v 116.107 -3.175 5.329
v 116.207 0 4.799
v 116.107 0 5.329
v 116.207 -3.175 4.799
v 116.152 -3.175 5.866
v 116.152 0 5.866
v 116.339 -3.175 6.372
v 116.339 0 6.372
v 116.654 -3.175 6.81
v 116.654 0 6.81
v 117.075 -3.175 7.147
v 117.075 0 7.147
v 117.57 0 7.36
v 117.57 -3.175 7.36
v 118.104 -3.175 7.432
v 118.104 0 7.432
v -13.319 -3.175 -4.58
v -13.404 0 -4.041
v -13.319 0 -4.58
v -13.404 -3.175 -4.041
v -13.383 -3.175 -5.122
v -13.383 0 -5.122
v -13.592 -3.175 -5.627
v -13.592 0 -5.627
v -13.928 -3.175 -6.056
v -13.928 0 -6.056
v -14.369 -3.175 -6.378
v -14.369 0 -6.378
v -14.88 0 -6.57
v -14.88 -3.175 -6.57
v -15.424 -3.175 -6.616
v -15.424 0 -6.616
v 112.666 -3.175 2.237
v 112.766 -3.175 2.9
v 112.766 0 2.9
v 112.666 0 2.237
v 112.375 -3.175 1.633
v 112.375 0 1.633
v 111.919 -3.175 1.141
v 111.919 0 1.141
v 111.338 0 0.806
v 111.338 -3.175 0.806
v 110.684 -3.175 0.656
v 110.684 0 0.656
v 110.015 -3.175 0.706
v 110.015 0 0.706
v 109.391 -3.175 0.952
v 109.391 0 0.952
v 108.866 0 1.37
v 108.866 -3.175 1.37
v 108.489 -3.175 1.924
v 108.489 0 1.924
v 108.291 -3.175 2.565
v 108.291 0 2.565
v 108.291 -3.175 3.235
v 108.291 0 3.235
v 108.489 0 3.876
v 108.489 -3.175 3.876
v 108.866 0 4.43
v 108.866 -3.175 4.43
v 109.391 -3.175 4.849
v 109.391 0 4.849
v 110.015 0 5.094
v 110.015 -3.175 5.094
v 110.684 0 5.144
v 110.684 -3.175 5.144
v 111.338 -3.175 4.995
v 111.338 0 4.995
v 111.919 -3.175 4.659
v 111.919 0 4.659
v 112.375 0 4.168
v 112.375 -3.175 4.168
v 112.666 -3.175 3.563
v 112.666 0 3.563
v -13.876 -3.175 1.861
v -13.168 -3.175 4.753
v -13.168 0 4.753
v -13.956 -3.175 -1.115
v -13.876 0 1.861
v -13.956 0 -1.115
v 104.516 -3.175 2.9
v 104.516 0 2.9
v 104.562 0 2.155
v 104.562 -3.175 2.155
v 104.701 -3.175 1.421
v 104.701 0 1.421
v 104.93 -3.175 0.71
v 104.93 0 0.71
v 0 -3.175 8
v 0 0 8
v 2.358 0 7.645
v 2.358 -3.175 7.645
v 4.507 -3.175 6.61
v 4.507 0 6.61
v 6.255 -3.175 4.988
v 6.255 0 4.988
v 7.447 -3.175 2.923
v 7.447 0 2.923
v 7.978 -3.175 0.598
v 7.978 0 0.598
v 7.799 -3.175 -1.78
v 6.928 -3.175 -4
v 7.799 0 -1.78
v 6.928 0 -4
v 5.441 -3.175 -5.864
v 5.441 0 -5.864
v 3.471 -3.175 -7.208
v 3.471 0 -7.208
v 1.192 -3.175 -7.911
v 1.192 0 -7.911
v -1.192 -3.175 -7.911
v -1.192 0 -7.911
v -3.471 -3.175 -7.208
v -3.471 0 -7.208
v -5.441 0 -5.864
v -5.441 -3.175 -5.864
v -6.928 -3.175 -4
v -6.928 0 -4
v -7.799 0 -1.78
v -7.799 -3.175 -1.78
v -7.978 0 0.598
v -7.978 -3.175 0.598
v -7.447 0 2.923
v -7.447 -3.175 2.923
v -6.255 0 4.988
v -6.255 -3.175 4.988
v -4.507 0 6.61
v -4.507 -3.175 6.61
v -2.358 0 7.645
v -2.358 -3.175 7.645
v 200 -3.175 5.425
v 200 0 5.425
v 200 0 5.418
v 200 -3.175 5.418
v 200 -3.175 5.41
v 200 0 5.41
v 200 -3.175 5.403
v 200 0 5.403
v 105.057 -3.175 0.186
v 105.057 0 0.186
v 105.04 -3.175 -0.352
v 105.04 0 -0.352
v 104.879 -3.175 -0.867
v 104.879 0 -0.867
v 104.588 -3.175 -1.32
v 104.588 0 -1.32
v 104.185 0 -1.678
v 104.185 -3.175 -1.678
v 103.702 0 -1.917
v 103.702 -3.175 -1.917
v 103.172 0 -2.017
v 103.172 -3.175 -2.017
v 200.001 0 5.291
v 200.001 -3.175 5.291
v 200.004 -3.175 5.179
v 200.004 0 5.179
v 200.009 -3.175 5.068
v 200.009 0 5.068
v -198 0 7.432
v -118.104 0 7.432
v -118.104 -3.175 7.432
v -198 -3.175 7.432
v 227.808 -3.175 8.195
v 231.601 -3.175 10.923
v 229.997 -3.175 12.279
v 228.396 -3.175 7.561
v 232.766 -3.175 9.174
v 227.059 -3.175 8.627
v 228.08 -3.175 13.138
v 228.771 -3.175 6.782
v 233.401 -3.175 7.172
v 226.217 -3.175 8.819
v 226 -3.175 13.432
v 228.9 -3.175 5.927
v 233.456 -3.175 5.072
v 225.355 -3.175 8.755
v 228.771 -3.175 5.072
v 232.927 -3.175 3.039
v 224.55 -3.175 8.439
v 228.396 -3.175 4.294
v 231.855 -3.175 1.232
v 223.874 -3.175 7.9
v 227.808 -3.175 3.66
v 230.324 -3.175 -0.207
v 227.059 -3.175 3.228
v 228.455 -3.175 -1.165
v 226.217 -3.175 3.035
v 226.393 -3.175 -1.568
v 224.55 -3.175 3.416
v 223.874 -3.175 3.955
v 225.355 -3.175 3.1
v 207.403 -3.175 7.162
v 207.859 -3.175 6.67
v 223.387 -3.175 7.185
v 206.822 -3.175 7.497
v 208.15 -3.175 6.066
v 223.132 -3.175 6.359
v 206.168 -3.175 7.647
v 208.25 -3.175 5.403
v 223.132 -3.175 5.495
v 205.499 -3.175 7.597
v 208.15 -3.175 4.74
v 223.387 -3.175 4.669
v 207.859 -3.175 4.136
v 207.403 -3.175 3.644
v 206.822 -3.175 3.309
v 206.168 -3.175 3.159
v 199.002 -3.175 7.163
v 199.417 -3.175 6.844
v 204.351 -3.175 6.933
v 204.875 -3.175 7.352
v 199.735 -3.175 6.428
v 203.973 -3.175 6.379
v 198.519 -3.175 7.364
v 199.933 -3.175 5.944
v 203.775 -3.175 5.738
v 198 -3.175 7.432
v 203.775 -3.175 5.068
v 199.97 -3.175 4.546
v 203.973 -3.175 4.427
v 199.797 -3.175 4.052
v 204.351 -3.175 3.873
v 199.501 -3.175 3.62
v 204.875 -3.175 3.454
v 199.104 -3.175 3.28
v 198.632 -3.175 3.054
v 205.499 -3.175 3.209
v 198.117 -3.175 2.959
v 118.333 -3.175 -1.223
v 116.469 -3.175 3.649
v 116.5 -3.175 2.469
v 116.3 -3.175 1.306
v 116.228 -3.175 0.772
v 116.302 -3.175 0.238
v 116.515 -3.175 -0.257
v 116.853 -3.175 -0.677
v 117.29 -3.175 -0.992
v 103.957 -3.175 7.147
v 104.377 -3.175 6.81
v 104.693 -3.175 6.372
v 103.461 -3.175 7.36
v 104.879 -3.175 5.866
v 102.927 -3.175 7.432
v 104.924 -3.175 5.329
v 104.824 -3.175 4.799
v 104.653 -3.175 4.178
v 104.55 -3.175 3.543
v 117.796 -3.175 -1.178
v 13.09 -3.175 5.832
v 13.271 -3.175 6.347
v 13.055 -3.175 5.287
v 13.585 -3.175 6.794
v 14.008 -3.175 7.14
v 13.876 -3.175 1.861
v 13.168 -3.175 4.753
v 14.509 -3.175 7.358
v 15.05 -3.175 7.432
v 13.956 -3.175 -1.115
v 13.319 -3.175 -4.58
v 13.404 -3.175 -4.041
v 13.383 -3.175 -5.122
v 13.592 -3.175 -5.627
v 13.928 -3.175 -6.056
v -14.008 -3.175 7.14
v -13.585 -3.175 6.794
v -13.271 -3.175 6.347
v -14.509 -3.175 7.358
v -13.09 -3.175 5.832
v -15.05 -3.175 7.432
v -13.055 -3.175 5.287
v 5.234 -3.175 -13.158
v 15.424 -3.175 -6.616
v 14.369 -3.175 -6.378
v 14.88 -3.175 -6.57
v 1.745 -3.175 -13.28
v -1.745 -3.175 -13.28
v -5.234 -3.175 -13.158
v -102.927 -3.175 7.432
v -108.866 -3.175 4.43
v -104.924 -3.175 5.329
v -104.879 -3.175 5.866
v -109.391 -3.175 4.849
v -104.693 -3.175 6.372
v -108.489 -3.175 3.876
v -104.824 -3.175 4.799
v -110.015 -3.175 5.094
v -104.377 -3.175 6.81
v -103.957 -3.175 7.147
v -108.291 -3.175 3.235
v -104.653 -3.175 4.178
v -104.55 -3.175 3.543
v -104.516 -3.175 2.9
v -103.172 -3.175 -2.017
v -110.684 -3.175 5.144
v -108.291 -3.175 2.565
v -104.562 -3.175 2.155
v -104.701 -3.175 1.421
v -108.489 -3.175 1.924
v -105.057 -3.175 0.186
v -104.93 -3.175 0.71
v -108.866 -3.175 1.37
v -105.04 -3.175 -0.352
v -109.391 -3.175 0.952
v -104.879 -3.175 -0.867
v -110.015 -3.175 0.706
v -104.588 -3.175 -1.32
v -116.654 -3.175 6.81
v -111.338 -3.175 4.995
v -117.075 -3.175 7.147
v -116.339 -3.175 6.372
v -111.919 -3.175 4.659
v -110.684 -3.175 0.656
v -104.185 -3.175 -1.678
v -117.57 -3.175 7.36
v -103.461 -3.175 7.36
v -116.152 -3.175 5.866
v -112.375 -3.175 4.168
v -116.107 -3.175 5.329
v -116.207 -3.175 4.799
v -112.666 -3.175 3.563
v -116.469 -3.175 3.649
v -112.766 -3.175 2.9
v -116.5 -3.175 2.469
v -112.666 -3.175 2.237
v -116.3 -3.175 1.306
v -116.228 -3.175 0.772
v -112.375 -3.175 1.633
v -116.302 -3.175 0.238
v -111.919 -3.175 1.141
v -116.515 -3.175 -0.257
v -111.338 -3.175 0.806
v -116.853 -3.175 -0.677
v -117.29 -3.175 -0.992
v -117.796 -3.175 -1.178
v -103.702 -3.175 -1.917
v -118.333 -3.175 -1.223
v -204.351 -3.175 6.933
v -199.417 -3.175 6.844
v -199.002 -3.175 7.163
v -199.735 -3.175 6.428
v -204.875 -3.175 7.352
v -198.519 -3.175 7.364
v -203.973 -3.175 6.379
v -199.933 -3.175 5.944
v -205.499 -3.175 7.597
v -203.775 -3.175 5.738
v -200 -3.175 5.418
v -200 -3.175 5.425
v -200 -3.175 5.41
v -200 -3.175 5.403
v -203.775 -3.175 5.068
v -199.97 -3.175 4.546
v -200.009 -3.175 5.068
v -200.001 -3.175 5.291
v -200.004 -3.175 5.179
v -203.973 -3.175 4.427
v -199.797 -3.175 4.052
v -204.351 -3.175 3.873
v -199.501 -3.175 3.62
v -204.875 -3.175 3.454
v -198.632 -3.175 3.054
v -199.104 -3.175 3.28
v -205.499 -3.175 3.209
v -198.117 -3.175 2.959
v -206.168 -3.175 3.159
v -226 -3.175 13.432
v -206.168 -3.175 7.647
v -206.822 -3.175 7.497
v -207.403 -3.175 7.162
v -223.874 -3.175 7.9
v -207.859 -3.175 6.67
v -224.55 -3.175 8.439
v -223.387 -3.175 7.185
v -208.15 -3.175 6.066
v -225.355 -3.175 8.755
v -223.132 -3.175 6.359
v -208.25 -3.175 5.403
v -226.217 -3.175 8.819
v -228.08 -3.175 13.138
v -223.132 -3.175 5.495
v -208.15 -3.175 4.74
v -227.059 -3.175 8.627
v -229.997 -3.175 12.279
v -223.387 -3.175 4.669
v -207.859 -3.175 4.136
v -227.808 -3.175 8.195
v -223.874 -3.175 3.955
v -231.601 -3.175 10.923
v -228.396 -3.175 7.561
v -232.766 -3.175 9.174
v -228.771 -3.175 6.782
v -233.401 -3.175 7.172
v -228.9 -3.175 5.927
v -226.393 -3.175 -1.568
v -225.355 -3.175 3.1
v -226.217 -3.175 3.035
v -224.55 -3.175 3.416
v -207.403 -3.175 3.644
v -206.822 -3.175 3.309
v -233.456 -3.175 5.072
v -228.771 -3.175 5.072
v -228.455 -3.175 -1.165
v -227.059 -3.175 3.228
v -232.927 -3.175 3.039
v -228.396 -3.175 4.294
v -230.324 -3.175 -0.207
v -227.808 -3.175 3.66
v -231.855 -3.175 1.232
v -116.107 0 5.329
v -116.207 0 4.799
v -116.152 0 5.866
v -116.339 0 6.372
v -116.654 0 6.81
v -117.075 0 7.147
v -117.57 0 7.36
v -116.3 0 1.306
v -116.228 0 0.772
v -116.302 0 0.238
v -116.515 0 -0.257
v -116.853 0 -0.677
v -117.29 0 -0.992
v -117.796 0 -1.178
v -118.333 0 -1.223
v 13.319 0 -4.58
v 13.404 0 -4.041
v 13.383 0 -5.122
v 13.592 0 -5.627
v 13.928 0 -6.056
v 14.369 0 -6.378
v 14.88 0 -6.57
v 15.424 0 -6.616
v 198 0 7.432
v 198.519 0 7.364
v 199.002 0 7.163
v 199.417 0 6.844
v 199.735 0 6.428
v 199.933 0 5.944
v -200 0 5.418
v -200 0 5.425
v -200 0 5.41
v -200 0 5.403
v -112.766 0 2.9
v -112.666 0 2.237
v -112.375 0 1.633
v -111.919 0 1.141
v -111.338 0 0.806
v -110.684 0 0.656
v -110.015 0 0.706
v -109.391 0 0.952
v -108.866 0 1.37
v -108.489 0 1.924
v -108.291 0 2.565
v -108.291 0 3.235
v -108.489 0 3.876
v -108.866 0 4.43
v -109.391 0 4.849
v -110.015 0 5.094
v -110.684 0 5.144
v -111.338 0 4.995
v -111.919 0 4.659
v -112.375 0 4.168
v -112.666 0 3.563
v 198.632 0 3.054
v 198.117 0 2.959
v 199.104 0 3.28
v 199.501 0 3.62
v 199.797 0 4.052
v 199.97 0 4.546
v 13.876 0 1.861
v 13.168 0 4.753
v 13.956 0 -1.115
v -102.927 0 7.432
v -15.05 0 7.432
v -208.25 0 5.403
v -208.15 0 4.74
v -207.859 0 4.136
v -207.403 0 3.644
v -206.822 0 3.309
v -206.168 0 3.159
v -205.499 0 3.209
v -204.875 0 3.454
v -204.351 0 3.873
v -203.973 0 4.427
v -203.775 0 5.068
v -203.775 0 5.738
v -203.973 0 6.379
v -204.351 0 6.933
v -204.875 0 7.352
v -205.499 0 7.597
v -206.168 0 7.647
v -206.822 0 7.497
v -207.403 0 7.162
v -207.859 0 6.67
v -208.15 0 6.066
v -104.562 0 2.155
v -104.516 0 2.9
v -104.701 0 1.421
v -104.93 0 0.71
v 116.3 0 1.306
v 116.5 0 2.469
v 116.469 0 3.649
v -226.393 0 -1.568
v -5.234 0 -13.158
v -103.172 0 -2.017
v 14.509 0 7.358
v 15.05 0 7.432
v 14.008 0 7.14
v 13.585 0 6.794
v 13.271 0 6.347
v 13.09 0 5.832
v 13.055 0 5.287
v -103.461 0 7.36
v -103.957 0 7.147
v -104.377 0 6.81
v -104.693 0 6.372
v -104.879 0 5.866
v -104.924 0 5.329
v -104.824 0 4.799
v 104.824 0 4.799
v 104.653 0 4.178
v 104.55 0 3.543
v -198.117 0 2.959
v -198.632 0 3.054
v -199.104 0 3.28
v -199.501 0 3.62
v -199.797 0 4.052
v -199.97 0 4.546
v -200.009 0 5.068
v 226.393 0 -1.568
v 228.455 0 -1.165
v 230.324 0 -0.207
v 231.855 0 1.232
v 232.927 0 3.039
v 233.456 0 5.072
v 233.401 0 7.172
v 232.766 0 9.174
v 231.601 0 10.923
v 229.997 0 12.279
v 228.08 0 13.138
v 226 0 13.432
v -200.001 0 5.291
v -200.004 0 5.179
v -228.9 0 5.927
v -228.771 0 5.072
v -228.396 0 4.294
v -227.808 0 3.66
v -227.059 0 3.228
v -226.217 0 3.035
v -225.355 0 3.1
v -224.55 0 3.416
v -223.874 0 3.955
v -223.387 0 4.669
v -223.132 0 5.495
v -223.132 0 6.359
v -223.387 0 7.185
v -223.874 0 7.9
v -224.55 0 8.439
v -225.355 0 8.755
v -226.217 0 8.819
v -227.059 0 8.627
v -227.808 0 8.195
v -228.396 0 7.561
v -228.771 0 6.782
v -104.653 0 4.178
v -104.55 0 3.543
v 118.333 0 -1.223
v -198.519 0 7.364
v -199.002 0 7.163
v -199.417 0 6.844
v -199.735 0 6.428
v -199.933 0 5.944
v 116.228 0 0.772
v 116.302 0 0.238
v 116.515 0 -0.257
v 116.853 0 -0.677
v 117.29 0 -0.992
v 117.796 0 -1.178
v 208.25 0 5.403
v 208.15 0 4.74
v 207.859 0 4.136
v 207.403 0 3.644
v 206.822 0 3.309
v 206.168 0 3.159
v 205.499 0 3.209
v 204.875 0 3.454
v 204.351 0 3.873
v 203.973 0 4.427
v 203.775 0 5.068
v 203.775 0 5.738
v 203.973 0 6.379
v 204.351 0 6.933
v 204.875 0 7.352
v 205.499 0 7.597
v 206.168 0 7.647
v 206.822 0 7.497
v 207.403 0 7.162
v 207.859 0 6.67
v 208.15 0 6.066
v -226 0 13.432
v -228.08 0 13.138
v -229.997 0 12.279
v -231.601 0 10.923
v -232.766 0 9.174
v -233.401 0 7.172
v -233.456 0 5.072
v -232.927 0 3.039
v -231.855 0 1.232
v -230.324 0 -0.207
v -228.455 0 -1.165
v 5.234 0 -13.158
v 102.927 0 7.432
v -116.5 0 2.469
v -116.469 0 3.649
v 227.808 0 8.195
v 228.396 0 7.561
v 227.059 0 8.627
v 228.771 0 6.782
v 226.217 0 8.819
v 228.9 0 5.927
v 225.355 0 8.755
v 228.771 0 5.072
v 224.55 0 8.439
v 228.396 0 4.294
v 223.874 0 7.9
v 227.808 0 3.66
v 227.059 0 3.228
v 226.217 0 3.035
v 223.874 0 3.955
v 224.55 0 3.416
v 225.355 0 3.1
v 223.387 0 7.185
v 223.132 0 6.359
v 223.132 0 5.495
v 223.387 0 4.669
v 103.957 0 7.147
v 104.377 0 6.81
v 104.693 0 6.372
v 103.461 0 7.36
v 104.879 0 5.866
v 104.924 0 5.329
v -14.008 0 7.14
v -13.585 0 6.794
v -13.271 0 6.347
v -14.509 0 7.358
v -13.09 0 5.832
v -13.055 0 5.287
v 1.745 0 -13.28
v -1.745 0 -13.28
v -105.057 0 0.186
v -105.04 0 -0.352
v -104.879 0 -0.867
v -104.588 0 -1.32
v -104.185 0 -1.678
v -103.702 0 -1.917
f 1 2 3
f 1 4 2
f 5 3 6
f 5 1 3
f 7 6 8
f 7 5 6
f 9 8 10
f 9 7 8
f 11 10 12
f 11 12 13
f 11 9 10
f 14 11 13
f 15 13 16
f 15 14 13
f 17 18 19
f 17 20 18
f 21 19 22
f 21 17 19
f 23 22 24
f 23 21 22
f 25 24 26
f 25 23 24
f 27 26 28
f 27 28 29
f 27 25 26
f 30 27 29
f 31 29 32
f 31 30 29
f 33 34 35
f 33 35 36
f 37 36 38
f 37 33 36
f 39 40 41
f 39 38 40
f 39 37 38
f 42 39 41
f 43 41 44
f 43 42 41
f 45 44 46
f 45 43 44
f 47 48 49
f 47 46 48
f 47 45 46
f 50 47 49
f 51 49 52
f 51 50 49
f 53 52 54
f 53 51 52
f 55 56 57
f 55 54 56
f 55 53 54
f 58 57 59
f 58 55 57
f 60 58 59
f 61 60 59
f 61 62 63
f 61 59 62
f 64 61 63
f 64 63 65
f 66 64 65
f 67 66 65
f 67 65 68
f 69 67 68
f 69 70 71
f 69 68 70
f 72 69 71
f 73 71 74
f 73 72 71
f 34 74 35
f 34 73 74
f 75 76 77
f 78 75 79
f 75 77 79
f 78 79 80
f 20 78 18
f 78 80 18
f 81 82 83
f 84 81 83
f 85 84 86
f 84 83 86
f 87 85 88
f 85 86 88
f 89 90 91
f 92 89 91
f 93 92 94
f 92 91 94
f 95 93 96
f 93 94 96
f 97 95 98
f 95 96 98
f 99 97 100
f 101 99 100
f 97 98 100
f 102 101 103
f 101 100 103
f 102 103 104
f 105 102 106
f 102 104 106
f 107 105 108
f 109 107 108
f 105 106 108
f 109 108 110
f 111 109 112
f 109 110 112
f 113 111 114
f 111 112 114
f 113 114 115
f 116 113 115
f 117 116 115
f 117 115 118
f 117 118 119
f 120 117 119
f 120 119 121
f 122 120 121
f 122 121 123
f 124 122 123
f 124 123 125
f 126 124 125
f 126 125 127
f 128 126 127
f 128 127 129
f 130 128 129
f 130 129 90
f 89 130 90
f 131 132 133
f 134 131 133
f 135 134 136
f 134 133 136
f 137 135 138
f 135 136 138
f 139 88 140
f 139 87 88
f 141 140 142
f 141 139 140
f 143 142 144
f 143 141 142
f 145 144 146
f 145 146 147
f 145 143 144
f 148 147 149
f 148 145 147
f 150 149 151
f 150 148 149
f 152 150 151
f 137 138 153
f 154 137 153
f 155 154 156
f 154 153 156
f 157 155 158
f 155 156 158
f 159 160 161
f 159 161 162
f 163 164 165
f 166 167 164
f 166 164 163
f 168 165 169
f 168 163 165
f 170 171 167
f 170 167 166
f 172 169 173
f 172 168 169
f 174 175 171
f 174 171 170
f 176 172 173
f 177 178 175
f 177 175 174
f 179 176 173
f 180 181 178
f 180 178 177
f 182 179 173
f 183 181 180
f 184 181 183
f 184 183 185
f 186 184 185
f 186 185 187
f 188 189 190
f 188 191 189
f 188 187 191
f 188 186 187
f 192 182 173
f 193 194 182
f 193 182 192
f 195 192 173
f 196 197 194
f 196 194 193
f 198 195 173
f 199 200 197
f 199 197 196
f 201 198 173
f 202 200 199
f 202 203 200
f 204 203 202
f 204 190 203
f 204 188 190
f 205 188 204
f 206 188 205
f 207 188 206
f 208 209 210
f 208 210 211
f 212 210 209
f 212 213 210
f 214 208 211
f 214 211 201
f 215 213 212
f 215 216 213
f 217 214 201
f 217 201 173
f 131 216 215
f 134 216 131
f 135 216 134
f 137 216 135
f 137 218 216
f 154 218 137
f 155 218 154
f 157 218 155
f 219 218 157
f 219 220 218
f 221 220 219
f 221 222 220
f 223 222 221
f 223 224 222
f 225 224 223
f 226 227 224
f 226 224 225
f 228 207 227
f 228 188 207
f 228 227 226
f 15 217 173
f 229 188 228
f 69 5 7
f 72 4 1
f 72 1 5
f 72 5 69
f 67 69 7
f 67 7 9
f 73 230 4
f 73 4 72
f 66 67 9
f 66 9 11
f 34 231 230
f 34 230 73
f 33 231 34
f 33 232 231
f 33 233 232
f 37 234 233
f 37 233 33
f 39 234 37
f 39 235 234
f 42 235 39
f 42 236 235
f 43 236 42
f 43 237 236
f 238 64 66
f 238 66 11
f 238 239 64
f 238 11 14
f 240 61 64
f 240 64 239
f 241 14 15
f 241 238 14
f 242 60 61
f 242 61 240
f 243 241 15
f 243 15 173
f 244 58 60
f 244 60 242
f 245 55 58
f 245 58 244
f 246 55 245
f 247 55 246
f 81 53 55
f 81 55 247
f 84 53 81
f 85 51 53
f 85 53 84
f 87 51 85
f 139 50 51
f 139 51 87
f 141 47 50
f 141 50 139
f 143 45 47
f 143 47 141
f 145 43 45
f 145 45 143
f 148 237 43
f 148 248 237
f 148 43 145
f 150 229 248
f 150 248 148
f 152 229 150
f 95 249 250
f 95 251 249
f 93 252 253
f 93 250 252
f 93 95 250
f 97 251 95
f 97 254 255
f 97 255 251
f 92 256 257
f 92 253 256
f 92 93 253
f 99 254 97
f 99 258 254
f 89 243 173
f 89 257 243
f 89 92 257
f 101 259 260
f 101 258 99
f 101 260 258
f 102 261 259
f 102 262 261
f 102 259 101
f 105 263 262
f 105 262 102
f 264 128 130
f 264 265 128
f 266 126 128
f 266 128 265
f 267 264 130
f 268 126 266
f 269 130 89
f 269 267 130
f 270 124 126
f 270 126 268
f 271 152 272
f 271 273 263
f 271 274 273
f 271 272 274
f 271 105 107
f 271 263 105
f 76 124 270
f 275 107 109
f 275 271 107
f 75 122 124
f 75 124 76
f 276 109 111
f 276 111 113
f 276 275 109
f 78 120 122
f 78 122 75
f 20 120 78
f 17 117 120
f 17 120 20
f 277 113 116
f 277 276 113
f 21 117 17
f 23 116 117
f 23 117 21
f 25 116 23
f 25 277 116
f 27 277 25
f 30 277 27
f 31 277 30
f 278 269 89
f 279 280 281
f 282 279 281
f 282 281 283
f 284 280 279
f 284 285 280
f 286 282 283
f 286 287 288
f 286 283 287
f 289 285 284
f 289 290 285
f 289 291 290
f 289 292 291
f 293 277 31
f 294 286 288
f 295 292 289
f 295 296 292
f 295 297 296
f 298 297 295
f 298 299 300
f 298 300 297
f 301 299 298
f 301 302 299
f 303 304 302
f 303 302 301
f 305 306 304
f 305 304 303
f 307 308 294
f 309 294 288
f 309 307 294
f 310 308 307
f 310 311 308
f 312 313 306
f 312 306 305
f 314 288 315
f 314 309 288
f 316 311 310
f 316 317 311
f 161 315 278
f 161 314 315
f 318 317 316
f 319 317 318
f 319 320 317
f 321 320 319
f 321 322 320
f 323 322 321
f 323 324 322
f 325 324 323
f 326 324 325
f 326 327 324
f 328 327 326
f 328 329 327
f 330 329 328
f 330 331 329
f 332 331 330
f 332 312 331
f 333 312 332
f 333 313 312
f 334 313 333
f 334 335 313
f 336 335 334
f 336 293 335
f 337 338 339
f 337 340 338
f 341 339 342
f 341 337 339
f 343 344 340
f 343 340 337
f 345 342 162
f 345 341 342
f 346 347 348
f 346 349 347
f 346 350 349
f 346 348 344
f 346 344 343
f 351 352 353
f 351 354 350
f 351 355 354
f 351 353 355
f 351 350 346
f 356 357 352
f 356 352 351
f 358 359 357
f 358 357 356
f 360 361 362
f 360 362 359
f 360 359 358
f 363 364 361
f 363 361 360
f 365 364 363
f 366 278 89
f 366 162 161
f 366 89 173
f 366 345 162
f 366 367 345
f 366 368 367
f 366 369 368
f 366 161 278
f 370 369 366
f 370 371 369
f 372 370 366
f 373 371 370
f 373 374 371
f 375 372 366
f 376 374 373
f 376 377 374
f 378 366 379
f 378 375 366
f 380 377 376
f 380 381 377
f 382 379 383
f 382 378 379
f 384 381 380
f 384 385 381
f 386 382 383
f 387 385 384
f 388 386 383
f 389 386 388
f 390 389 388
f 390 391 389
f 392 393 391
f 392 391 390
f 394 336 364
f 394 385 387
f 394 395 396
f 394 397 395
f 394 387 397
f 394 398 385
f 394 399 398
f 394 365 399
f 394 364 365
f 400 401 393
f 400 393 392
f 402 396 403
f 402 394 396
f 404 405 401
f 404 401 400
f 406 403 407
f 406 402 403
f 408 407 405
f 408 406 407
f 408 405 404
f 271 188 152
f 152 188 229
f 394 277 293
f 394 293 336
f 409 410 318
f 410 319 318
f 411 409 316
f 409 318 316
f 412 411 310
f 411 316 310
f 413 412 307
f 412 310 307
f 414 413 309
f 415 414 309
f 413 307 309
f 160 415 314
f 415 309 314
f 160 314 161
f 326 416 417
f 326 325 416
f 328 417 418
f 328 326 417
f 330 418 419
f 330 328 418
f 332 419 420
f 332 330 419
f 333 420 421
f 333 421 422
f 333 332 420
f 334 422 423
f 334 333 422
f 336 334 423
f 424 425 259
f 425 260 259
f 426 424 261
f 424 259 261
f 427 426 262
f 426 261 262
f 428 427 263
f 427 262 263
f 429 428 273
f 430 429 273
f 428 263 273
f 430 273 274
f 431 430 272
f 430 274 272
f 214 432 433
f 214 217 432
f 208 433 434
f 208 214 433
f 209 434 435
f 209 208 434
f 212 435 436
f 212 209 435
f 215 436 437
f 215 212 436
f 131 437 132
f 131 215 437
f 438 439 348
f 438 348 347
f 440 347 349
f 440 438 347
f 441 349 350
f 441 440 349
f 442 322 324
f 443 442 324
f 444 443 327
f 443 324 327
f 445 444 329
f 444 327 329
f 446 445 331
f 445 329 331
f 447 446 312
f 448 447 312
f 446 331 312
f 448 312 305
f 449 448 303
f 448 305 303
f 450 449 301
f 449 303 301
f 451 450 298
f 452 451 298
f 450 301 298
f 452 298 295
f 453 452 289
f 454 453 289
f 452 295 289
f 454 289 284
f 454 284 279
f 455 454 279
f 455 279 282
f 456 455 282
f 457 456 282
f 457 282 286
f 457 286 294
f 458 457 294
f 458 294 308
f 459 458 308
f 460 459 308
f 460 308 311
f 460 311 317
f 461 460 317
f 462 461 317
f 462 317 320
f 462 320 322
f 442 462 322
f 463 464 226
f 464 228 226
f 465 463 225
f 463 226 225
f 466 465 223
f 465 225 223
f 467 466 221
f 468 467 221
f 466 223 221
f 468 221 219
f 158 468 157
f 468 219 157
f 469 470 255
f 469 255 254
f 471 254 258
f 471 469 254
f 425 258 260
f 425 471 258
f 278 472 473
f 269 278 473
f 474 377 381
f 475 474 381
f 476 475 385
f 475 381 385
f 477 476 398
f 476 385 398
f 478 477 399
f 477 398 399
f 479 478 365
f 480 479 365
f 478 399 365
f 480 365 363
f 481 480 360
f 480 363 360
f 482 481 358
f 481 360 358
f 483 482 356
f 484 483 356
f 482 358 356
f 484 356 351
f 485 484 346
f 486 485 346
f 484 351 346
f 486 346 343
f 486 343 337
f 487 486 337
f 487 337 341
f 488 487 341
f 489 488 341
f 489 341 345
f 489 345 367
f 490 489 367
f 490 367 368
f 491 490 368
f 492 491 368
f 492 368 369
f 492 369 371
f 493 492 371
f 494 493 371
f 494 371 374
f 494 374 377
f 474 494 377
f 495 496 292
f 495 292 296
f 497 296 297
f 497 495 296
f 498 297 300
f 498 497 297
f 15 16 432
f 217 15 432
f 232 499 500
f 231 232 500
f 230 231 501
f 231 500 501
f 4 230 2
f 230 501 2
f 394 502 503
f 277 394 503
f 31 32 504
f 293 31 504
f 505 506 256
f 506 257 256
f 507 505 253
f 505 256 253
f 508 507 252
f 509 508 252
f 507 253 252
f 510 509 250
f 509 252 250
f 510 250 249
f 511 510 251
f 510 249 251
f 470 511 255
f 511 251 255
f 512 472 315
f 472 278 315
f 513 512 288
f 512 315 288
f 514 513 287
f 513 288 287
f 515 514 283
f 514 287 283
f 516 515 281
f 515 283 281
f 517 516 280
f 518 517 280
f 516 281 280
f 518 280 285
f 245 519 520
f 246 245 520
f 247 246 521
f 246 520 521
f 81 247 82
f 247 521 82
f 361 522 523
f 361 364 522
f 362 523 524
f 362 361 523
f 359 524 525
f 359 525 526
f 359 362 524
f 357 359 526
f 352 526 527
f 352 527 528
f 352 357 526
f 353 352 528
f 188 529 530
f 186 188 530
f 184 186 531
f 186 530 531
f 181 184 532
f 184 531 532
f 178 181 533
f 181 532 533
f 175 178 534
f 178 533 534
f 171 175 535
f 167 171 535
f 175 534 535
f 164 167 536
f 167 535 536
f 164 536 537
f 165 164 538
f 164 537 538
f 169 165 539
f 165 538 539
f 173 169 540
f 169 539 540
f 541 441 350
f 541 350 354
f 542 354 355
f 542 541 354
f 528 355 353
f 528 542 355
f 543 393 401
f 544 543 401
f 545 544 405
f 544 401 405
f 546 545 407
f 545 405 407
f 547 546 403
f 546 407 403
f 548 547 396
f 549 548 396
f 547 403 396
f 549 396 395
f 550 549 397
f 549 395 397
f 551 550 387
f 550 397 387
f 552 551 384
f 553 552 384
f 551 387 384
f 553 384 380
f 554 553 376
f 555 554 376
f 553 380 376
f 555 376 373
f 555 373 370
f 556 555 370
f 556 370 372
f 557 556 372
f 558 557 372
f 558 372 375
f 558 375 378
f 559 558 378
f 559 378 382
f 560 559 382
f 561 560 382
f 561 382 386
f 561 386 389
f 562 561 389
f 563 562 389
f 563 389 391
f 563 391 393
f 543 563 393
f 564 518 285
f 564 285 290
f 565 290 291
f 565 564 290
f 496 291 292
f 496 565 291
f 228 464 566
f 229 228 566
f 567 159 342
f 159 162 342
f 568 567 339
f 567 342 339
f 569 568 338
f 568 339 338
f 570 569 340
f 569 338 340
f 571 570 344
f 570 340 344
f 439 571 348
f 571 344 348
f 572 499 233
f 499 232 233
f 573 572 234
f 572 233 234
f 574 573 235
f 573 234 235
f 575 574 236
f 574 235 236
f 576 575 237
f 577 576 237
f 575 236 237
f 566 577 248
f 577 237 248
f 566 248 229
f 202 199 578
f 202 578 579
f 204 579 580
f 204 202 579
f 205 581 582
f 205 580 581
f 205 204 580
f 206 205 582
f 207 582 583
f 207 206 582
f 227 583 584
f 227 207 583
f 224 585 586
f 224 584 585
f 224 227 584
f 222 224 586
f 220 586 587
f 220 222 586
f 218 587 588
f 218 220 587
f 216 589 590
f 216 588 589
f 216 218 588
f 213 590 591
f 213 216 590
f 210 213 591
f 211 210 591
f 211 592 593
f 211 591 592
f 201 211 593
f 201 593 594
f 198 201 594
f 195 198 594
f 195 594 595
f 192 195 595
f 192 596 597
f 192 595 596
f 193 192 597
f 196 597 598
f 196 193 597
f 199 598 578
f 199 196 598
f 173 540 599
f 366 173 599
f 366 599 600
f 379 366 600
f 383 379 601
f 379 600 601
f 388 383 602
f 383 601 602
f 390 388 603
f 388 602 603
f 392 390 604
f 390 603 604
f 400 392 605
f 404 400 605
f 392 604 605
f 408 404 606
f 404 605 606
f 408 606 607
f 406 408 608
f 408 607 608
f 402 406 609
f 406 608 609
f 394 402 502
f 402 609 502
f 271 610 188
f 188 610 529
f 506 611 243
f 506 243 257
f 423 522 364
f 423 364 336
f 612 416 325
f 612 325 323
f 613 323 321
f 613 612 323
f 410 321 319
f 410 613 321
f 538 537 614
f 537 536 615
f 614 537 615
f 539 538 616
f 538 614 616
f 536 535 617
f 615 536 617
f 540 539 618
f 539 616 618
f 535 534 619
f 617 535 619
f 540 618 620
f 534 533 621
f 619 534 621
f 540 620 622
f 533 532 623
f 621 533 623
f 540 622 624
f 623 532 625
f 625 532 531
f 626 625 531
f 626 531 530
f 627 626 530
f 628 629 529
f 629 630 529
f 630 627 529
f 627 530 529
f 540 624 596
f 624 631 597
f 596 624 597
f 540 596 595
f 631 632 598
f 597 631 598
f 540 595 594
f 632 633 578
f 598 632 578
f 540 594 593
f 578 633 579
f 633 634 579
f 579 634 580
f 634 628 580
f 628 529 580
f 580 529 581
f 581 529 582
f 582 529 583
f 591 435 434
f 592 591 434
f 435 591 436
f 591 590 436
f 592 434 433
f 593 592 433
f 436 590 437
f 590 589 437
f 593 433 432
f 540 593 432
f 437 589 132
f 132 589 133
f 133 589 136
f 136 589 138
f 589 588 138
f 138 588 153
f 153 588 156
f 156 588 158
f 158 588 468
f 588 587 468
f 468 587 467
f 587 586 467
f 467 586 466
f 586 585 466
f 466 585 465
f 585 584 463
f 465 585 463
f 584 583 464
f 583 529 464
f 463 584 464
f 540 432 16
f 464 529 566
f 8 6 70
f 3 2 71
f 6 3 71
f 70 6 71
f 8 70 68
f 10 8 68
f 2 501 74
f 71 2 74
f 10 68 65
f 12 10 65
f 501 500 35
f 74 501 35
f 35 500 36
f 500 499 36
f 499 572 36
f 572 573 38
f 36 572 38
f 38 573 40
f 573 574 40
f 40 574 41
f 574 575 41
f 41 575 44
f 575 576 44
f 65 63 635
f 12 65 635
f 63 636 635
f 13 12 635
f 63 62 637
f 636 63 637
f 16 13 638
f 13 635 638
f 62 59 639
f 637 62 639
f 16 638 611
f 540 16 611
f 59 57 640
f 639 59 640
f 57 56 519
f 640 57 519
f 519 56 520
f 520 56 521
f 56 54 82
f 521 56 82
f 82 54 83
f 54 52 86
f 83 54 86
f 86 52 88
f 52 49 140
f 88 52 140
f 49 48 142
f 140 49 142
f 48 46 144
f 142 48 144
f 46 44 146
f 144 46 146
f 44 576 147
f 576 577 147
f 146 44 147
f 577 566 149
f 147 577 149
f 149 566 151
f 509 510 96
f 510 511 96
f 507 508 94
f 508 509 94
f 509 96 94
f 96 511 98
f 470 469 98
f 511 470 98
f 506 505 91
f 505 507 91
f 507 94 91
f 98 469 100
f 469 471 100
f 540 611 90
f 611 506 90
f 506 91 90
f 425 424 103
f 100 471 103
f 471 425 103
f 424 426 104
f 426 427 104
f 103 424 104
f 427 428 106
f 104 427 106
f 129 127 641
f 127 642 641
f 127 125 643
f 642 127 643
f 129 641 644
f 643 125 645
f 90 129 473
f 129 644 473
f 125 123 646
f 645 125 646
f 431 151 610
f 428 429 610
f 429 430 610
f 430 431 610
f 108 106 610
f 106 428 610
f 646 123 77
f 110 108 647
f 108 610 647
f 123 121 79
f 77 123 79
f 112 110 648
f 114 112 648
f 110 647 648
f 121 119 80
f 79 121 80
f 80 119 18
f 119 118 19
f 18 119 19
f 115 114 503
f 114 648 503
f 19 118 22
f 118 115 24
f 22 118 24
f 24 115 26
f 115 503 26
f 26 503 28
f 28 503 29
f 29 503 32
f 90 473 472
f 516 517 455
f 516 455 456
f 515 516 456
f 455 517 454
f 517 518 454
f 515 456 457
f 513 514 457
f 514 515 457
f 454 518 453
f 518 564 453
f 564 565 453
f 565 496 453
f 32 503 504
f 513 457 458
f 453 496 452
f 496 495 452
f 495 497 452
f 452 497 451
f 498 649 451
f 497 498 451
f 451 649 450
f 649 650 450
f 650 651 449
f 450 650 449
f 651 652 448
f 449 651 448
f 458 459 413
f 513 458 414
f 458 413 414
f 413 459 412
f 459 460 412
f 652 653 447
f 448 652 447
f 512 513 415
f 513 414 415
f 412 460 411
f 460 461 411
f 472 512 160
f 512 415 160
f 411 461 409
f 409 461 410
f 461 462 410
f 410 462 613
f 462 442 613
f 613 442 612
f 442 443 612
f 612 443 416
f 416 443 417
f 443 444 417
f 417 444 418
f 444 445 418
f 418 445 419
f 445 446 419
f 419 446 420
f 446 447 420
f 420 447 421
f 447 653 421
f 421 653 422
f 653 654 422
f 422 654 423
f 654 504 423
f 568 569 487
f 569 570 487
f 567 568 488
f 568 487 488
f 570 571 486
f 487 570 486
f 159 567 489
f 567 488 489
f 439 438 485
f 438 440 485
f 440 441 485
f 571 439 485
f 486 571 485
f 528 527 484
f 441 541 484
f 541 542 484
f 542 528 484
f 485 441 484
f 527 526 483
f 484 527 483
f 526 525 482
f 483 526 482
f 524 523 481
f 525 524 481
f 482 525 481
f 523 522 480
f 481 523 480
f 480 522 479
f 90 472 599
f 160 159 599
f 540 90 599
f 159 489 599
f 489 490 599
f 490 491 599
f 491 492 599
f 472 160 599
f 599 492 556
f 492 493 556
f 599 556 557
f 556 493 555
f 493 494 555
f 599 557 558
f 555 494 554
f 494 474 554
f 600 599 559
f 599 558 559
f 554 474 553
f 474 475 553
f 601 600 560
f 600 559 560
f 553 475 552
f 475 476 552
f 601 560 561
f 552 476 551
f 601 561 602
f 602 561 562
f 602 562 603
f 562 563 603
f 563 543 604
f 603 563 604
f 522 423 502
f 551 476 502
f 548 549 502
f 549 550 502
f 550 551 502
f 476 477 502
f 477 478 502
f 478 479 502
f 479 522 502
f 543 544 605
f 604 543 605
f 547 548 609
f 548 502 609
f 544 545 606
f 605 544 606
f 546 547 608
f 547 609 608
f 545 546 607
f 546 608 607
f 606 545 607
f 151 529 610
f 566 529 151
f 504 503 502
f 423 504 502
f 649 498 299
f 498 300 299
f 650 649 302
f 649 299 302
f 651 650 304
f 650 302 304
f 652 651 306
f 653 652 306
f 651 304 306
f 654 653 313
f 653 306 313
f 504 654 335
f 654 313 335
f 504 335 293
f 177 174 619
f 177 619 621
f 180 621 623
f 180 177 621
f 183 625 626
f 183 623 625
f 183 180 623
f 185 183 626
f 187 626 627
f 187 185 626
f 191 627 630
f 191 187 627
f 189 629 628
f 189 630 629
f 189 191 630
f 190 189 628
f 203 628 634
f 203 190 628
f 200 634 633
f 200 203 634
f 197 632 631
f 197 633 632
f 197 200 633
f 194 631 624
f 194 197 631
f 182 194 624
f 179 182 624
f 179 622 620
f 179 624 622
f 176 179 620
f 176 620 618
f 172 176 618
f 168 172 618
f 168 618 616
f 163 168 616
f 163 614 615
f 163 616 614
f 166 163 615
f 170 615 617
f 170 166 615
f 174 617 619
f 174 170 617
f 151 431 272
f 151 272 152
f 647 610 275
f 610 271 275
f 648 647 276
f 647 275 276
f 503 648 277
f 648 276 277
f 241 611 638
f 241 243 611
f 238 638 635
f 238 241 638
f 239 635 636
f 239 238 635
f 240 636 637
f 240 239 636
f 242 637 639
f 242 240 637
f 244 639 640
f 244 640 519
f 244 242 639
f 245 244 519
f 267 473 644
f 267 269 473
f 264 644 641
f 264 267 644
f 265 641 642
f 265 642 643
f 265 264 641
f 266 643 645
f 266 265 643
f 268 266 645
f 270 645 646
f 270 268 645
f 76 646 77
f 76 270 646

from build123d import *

# Parameters (mm, degrees)
BASE_FLANGE1_DEPTH             = 3.175
SKETCH11_R                     = 8
CUT_EXTRUDE1_CENTER_HOLE_DEPTH = 234.912720759
M5_CLEARANCE_HOLE1_EDGE_D      = 5.8
CUT_EXTRUDE2_DEPTH             = 234.912720759
BOSS_EXTRUDE3_DEPTH            = 3.175
M4_CLEARANCE_HOLE1_D           = 4.5
FILLET1_R                      = 2
FILLET1_OF_MIRROR1_R           = 2
FILLET2_R                      = 100


# Sheet-metal steps are written as plain solids
with BuildPart() as part:
    # Sketch1 → Base-Flange1 (new body)
    with BuildSketch(Plane(origin=(0, 0, 0), x_dir=(1, 0, 0), z_dir=(0, 1, 0))):
        with BuildLine():
            Line((226, -13.432371654), (-226, -13.432371654))
            ThreePointArc((-226, -13.432371654), (-233.502570944, -6.12369062), (-226.392788824, 1.567628346))
            Line((-226.392788824, 1.567628346), (0, 13.432371654))
            Line((0, 13.432371654), (226.392788824, 1.567628346))
            ThreePointArc((226.392788824, 1.567628346), (233.502570944, -6.12369062), (226, -13.432371654))
        make_face()
    extrude(amount=-BASE_FLANGE1_DEPTH)

    # Sketch11 → Cut-Extrude1_Center Hole (cut, through all)
    with BuildSketch(Plane(origin=(0, 0, 0), x_dir=(1, 0, 0), z_dir=(0, 1, 0))):
        with Locations(Location((0, 0, 0), (0, 0, 270))):
            Circle(SKETCH11_R)
    extrude(amount=-CUT_EXTRUDE1_CENTER_HOLE_DEPTH, mode=Mode.SUBTRACT)

    # M5 Clearance Hole1_Edge (through all)
    with Locations(Plane(origin=(0, 0, 0), x_dir=(1, 0, 0), z_dir=(0, 1, 0))):
        with Locations((-226, -5.927228885)):
            m5_clearance_hole1_edge = Hole(M5_CLEARANCE_HOLE1_EDGE_D / 2)

    # Sketch12 → Cut-Extrude2 (cut, through all)
    with BuildSketch(Plane(origin=(0, 0, 0), x_dir=(1, 0, 0), z_dir=(0, 1, 0))):
        with BuildLine():
            Line((-209.269000639, -3.543186018), (-113.515692218, 1.475032235))
            Line((-113.515692218, 1.475032235), (-113.515692218, -7.432371654))
            Line((-113.515692218, -7.432371654), (-209.167158729, -7.432371654))
            ThreePointArc((-209.167158729, -7.432371654), (-209.105791208, -5.484838459), (-209.269000639, -3.543186018))
        make_face()
        with BuildLine():
            Line((-107.515692218, 1.789478911), (-107.515692218, -7.432371654))
            Line((-107.515692218, -7.432371654), (-11.864225706, -7.432371654))
            ThreePointArc((-11.864225706, -7.432371654), (-13.994914166, -0.377329415), (-12.247479508, 6.782274375))
            Line((-12.247479508, 6.782274375), (-107.515692218, 1.789478911))
        make_face()
    cut_extrude2 = extrude(amount=-CUT_EXTRUDE2_DEPTH, mode=Mode.SUBTRACT)

    # Sketch16 → Boss-Extrude3 (add)
    with BuildSketch(Plane(origin=(0, 0, 0), x_dir=(1, 0, 0), z_dir=(0, 1, 0))):
        with BuildLine():
            Line((-113.515692218, -7.432371654), (-113.515692218, -2.978669709))
            Line((-113.515692218, -2.978669709), (-113.515692218, 1.475032235))
            Line((-113.515692218, 1.475032235), (-114.686004205, 1.413698783))
            ThreePointArc((-114.686004205, 1.413698783), (-116.513510347, -3.061853233), (-114.447375484, -7.432371654))
            Line((-114.447375484, -7.432371654), (-113.515692218, -7.432371654))
        make_face()
        with BuildLine():
            Line((-107.515692218, 1.789478911), (-107.515692218, -2.821446372))
            Line((-107.515692218, -2.821446372), (-107.515692218, -7.432371654))
            Line((-107.515692218, -7.432371654), (-106.584008951, -7.432371654))
            ThreePointArc((-106.584008951, -7.432371654), (-105.057208014, -5.391031786), (-104.515692218, -2.900058041))
            ThreePointArc((-104.515692218, -2.900058041), (-105.122208313, -0.271307126), (-106.819136008, 1.825983875))
            Line((-106.819136008, 1.825983875), (-107.515692218, 1.789478911))
        make_face()
        with BuildLine():
            ThreePointArc((-200, -5.40297223), (-200.117942339, -4.219165794), (-200.467132559, -3.081899659))
            Line((-200.467132559, -3.081899659), (-209.269000639, -3.543186018))
            ThreePointArc((-209.269000639, -3.543186018), (-209.105791208, -5.484838459), (-209.167158729, -7.432371654))
            Line((-209.167158729, -7.432371654), (-200.353626121, -7.432371654))
            ThreePointArc((-200.353626121, -7.432371654), (-200.089067617, -6.432961727), (-200, -5.40297223))
        make_face()
        with BuildLine():
            Line((-209.269000639, -3.543186018), (-200.467132559, -3.081899659))
            ThreePointArc((-200.467132559, -3.081899659), (-211.997958883, -5.559462595), (-200.353626121, -7.432371654))
            Line((-200.353626121, -7.432371654), (-209.167158729, -7.432371654))
            ThreePointArc((-209.167158729, -7.432371654), (-209.105791208, -5.484838459), (-209.269000639, -3.543186018))
        make_face()
    boss_extrude3 = extrude(amount=-BOSS_EXTRUDE3_DEPTH)

    # M4 Clearance Hole1 (through all)
    with Locations(Plane(origin=(0, 0, 0), x_dir=(1, 0, 0), z_dir=(0, 1, 0))):
        with Locations((-206, -5.40297223), (-110.515692218, -2.900058041)):
            m4_clearance_hole1 = Hole(M4_CLEARANCE_HOLE1_D / 2)

    # Fillet1
    fillet1_edges = [part.edges().sort_by_distance(p)[0] for p in [
        (-12.247479508, -1.5875, -6.782274375),
        (-11.864225706, -1.5875, 7.432371654),
        (-114.447375484, -1.5875, 7.432371654),
        (-114.686004205, -1.5875, -1.413698783),
        (-106.819136008, -1.5875, -1.825983875),
        (-106.584008951, -1.5875, 7.432371654),
        (-200.467132559, -1.5875, 3.081899659),
        (-200.353626121, -1.5875, 7.432371654),
    ]]
    fillet(fillet1_edges, radius=FILLET1_R)

    # Mirror1: M5 Clearance Hole1_Edge, Cut-Extrude2, Boss-Extrude3, M4 Clearance Hole1 across plane
    add(m5_clearance_hole1_edge.mirror(Plane(origin=(0, 0, 0), x_dir=(0, 0, 1), z_dir=(1, 0, 0))), mode=Mode.SUBTRACT)
    add(cut_extrude2.mirror(Plane(origin=(0, 0, 0), x_dir=(0, 0, 1), z_dir=(1, 0, 0))), mode=Mode.SUBTRACT)
    add(boss_extrude3.mirror(Plane(origin=(0, 0, 0), x_dir=(0, 0, 1), z_dir=(1, 0, 0))))
    add(m4_clearance_hole1.mirror(Plane(origin=(0, 0, 0), x_dir=(0, 0, 1), z_dir=(1, 0, 0))), mode=Mode.SUBTRACT)

    # Fillet1 of Mirror1
    fillet1_of_mirror1_edges = [part.edges().sort_by_distance(p)[0] for p in [
        (12.247479508, -1.5875, -6.782274375),
        (11.864225706, -1.5875, 7.432371654),
        (114.447375484, -1.5875, 7.432371654),
        (114.686004205, -1.5875, -1.413698783),
        (106.819136008, -1.5875, -1.825983875),
        (106.584008951, -1.5875, 7.432371654),
        (200.467132559, -1.5875, 3.081899659),
        (200.353626121, -1.5875, 7.432371654),
    ]]
    fillet(fillet1_of_mirror1_edges, radius=FILLET1_OF_MIRROR1_R)

    # Fillet2
    fillet2_edges = [part.edges().sort_by_distance(p)[0] for p in [
        (0, -1.5875, -13.432371654),
    ]]
    fillet(fillet2_edges, radius=FILLET2_R)


solid = part.part
